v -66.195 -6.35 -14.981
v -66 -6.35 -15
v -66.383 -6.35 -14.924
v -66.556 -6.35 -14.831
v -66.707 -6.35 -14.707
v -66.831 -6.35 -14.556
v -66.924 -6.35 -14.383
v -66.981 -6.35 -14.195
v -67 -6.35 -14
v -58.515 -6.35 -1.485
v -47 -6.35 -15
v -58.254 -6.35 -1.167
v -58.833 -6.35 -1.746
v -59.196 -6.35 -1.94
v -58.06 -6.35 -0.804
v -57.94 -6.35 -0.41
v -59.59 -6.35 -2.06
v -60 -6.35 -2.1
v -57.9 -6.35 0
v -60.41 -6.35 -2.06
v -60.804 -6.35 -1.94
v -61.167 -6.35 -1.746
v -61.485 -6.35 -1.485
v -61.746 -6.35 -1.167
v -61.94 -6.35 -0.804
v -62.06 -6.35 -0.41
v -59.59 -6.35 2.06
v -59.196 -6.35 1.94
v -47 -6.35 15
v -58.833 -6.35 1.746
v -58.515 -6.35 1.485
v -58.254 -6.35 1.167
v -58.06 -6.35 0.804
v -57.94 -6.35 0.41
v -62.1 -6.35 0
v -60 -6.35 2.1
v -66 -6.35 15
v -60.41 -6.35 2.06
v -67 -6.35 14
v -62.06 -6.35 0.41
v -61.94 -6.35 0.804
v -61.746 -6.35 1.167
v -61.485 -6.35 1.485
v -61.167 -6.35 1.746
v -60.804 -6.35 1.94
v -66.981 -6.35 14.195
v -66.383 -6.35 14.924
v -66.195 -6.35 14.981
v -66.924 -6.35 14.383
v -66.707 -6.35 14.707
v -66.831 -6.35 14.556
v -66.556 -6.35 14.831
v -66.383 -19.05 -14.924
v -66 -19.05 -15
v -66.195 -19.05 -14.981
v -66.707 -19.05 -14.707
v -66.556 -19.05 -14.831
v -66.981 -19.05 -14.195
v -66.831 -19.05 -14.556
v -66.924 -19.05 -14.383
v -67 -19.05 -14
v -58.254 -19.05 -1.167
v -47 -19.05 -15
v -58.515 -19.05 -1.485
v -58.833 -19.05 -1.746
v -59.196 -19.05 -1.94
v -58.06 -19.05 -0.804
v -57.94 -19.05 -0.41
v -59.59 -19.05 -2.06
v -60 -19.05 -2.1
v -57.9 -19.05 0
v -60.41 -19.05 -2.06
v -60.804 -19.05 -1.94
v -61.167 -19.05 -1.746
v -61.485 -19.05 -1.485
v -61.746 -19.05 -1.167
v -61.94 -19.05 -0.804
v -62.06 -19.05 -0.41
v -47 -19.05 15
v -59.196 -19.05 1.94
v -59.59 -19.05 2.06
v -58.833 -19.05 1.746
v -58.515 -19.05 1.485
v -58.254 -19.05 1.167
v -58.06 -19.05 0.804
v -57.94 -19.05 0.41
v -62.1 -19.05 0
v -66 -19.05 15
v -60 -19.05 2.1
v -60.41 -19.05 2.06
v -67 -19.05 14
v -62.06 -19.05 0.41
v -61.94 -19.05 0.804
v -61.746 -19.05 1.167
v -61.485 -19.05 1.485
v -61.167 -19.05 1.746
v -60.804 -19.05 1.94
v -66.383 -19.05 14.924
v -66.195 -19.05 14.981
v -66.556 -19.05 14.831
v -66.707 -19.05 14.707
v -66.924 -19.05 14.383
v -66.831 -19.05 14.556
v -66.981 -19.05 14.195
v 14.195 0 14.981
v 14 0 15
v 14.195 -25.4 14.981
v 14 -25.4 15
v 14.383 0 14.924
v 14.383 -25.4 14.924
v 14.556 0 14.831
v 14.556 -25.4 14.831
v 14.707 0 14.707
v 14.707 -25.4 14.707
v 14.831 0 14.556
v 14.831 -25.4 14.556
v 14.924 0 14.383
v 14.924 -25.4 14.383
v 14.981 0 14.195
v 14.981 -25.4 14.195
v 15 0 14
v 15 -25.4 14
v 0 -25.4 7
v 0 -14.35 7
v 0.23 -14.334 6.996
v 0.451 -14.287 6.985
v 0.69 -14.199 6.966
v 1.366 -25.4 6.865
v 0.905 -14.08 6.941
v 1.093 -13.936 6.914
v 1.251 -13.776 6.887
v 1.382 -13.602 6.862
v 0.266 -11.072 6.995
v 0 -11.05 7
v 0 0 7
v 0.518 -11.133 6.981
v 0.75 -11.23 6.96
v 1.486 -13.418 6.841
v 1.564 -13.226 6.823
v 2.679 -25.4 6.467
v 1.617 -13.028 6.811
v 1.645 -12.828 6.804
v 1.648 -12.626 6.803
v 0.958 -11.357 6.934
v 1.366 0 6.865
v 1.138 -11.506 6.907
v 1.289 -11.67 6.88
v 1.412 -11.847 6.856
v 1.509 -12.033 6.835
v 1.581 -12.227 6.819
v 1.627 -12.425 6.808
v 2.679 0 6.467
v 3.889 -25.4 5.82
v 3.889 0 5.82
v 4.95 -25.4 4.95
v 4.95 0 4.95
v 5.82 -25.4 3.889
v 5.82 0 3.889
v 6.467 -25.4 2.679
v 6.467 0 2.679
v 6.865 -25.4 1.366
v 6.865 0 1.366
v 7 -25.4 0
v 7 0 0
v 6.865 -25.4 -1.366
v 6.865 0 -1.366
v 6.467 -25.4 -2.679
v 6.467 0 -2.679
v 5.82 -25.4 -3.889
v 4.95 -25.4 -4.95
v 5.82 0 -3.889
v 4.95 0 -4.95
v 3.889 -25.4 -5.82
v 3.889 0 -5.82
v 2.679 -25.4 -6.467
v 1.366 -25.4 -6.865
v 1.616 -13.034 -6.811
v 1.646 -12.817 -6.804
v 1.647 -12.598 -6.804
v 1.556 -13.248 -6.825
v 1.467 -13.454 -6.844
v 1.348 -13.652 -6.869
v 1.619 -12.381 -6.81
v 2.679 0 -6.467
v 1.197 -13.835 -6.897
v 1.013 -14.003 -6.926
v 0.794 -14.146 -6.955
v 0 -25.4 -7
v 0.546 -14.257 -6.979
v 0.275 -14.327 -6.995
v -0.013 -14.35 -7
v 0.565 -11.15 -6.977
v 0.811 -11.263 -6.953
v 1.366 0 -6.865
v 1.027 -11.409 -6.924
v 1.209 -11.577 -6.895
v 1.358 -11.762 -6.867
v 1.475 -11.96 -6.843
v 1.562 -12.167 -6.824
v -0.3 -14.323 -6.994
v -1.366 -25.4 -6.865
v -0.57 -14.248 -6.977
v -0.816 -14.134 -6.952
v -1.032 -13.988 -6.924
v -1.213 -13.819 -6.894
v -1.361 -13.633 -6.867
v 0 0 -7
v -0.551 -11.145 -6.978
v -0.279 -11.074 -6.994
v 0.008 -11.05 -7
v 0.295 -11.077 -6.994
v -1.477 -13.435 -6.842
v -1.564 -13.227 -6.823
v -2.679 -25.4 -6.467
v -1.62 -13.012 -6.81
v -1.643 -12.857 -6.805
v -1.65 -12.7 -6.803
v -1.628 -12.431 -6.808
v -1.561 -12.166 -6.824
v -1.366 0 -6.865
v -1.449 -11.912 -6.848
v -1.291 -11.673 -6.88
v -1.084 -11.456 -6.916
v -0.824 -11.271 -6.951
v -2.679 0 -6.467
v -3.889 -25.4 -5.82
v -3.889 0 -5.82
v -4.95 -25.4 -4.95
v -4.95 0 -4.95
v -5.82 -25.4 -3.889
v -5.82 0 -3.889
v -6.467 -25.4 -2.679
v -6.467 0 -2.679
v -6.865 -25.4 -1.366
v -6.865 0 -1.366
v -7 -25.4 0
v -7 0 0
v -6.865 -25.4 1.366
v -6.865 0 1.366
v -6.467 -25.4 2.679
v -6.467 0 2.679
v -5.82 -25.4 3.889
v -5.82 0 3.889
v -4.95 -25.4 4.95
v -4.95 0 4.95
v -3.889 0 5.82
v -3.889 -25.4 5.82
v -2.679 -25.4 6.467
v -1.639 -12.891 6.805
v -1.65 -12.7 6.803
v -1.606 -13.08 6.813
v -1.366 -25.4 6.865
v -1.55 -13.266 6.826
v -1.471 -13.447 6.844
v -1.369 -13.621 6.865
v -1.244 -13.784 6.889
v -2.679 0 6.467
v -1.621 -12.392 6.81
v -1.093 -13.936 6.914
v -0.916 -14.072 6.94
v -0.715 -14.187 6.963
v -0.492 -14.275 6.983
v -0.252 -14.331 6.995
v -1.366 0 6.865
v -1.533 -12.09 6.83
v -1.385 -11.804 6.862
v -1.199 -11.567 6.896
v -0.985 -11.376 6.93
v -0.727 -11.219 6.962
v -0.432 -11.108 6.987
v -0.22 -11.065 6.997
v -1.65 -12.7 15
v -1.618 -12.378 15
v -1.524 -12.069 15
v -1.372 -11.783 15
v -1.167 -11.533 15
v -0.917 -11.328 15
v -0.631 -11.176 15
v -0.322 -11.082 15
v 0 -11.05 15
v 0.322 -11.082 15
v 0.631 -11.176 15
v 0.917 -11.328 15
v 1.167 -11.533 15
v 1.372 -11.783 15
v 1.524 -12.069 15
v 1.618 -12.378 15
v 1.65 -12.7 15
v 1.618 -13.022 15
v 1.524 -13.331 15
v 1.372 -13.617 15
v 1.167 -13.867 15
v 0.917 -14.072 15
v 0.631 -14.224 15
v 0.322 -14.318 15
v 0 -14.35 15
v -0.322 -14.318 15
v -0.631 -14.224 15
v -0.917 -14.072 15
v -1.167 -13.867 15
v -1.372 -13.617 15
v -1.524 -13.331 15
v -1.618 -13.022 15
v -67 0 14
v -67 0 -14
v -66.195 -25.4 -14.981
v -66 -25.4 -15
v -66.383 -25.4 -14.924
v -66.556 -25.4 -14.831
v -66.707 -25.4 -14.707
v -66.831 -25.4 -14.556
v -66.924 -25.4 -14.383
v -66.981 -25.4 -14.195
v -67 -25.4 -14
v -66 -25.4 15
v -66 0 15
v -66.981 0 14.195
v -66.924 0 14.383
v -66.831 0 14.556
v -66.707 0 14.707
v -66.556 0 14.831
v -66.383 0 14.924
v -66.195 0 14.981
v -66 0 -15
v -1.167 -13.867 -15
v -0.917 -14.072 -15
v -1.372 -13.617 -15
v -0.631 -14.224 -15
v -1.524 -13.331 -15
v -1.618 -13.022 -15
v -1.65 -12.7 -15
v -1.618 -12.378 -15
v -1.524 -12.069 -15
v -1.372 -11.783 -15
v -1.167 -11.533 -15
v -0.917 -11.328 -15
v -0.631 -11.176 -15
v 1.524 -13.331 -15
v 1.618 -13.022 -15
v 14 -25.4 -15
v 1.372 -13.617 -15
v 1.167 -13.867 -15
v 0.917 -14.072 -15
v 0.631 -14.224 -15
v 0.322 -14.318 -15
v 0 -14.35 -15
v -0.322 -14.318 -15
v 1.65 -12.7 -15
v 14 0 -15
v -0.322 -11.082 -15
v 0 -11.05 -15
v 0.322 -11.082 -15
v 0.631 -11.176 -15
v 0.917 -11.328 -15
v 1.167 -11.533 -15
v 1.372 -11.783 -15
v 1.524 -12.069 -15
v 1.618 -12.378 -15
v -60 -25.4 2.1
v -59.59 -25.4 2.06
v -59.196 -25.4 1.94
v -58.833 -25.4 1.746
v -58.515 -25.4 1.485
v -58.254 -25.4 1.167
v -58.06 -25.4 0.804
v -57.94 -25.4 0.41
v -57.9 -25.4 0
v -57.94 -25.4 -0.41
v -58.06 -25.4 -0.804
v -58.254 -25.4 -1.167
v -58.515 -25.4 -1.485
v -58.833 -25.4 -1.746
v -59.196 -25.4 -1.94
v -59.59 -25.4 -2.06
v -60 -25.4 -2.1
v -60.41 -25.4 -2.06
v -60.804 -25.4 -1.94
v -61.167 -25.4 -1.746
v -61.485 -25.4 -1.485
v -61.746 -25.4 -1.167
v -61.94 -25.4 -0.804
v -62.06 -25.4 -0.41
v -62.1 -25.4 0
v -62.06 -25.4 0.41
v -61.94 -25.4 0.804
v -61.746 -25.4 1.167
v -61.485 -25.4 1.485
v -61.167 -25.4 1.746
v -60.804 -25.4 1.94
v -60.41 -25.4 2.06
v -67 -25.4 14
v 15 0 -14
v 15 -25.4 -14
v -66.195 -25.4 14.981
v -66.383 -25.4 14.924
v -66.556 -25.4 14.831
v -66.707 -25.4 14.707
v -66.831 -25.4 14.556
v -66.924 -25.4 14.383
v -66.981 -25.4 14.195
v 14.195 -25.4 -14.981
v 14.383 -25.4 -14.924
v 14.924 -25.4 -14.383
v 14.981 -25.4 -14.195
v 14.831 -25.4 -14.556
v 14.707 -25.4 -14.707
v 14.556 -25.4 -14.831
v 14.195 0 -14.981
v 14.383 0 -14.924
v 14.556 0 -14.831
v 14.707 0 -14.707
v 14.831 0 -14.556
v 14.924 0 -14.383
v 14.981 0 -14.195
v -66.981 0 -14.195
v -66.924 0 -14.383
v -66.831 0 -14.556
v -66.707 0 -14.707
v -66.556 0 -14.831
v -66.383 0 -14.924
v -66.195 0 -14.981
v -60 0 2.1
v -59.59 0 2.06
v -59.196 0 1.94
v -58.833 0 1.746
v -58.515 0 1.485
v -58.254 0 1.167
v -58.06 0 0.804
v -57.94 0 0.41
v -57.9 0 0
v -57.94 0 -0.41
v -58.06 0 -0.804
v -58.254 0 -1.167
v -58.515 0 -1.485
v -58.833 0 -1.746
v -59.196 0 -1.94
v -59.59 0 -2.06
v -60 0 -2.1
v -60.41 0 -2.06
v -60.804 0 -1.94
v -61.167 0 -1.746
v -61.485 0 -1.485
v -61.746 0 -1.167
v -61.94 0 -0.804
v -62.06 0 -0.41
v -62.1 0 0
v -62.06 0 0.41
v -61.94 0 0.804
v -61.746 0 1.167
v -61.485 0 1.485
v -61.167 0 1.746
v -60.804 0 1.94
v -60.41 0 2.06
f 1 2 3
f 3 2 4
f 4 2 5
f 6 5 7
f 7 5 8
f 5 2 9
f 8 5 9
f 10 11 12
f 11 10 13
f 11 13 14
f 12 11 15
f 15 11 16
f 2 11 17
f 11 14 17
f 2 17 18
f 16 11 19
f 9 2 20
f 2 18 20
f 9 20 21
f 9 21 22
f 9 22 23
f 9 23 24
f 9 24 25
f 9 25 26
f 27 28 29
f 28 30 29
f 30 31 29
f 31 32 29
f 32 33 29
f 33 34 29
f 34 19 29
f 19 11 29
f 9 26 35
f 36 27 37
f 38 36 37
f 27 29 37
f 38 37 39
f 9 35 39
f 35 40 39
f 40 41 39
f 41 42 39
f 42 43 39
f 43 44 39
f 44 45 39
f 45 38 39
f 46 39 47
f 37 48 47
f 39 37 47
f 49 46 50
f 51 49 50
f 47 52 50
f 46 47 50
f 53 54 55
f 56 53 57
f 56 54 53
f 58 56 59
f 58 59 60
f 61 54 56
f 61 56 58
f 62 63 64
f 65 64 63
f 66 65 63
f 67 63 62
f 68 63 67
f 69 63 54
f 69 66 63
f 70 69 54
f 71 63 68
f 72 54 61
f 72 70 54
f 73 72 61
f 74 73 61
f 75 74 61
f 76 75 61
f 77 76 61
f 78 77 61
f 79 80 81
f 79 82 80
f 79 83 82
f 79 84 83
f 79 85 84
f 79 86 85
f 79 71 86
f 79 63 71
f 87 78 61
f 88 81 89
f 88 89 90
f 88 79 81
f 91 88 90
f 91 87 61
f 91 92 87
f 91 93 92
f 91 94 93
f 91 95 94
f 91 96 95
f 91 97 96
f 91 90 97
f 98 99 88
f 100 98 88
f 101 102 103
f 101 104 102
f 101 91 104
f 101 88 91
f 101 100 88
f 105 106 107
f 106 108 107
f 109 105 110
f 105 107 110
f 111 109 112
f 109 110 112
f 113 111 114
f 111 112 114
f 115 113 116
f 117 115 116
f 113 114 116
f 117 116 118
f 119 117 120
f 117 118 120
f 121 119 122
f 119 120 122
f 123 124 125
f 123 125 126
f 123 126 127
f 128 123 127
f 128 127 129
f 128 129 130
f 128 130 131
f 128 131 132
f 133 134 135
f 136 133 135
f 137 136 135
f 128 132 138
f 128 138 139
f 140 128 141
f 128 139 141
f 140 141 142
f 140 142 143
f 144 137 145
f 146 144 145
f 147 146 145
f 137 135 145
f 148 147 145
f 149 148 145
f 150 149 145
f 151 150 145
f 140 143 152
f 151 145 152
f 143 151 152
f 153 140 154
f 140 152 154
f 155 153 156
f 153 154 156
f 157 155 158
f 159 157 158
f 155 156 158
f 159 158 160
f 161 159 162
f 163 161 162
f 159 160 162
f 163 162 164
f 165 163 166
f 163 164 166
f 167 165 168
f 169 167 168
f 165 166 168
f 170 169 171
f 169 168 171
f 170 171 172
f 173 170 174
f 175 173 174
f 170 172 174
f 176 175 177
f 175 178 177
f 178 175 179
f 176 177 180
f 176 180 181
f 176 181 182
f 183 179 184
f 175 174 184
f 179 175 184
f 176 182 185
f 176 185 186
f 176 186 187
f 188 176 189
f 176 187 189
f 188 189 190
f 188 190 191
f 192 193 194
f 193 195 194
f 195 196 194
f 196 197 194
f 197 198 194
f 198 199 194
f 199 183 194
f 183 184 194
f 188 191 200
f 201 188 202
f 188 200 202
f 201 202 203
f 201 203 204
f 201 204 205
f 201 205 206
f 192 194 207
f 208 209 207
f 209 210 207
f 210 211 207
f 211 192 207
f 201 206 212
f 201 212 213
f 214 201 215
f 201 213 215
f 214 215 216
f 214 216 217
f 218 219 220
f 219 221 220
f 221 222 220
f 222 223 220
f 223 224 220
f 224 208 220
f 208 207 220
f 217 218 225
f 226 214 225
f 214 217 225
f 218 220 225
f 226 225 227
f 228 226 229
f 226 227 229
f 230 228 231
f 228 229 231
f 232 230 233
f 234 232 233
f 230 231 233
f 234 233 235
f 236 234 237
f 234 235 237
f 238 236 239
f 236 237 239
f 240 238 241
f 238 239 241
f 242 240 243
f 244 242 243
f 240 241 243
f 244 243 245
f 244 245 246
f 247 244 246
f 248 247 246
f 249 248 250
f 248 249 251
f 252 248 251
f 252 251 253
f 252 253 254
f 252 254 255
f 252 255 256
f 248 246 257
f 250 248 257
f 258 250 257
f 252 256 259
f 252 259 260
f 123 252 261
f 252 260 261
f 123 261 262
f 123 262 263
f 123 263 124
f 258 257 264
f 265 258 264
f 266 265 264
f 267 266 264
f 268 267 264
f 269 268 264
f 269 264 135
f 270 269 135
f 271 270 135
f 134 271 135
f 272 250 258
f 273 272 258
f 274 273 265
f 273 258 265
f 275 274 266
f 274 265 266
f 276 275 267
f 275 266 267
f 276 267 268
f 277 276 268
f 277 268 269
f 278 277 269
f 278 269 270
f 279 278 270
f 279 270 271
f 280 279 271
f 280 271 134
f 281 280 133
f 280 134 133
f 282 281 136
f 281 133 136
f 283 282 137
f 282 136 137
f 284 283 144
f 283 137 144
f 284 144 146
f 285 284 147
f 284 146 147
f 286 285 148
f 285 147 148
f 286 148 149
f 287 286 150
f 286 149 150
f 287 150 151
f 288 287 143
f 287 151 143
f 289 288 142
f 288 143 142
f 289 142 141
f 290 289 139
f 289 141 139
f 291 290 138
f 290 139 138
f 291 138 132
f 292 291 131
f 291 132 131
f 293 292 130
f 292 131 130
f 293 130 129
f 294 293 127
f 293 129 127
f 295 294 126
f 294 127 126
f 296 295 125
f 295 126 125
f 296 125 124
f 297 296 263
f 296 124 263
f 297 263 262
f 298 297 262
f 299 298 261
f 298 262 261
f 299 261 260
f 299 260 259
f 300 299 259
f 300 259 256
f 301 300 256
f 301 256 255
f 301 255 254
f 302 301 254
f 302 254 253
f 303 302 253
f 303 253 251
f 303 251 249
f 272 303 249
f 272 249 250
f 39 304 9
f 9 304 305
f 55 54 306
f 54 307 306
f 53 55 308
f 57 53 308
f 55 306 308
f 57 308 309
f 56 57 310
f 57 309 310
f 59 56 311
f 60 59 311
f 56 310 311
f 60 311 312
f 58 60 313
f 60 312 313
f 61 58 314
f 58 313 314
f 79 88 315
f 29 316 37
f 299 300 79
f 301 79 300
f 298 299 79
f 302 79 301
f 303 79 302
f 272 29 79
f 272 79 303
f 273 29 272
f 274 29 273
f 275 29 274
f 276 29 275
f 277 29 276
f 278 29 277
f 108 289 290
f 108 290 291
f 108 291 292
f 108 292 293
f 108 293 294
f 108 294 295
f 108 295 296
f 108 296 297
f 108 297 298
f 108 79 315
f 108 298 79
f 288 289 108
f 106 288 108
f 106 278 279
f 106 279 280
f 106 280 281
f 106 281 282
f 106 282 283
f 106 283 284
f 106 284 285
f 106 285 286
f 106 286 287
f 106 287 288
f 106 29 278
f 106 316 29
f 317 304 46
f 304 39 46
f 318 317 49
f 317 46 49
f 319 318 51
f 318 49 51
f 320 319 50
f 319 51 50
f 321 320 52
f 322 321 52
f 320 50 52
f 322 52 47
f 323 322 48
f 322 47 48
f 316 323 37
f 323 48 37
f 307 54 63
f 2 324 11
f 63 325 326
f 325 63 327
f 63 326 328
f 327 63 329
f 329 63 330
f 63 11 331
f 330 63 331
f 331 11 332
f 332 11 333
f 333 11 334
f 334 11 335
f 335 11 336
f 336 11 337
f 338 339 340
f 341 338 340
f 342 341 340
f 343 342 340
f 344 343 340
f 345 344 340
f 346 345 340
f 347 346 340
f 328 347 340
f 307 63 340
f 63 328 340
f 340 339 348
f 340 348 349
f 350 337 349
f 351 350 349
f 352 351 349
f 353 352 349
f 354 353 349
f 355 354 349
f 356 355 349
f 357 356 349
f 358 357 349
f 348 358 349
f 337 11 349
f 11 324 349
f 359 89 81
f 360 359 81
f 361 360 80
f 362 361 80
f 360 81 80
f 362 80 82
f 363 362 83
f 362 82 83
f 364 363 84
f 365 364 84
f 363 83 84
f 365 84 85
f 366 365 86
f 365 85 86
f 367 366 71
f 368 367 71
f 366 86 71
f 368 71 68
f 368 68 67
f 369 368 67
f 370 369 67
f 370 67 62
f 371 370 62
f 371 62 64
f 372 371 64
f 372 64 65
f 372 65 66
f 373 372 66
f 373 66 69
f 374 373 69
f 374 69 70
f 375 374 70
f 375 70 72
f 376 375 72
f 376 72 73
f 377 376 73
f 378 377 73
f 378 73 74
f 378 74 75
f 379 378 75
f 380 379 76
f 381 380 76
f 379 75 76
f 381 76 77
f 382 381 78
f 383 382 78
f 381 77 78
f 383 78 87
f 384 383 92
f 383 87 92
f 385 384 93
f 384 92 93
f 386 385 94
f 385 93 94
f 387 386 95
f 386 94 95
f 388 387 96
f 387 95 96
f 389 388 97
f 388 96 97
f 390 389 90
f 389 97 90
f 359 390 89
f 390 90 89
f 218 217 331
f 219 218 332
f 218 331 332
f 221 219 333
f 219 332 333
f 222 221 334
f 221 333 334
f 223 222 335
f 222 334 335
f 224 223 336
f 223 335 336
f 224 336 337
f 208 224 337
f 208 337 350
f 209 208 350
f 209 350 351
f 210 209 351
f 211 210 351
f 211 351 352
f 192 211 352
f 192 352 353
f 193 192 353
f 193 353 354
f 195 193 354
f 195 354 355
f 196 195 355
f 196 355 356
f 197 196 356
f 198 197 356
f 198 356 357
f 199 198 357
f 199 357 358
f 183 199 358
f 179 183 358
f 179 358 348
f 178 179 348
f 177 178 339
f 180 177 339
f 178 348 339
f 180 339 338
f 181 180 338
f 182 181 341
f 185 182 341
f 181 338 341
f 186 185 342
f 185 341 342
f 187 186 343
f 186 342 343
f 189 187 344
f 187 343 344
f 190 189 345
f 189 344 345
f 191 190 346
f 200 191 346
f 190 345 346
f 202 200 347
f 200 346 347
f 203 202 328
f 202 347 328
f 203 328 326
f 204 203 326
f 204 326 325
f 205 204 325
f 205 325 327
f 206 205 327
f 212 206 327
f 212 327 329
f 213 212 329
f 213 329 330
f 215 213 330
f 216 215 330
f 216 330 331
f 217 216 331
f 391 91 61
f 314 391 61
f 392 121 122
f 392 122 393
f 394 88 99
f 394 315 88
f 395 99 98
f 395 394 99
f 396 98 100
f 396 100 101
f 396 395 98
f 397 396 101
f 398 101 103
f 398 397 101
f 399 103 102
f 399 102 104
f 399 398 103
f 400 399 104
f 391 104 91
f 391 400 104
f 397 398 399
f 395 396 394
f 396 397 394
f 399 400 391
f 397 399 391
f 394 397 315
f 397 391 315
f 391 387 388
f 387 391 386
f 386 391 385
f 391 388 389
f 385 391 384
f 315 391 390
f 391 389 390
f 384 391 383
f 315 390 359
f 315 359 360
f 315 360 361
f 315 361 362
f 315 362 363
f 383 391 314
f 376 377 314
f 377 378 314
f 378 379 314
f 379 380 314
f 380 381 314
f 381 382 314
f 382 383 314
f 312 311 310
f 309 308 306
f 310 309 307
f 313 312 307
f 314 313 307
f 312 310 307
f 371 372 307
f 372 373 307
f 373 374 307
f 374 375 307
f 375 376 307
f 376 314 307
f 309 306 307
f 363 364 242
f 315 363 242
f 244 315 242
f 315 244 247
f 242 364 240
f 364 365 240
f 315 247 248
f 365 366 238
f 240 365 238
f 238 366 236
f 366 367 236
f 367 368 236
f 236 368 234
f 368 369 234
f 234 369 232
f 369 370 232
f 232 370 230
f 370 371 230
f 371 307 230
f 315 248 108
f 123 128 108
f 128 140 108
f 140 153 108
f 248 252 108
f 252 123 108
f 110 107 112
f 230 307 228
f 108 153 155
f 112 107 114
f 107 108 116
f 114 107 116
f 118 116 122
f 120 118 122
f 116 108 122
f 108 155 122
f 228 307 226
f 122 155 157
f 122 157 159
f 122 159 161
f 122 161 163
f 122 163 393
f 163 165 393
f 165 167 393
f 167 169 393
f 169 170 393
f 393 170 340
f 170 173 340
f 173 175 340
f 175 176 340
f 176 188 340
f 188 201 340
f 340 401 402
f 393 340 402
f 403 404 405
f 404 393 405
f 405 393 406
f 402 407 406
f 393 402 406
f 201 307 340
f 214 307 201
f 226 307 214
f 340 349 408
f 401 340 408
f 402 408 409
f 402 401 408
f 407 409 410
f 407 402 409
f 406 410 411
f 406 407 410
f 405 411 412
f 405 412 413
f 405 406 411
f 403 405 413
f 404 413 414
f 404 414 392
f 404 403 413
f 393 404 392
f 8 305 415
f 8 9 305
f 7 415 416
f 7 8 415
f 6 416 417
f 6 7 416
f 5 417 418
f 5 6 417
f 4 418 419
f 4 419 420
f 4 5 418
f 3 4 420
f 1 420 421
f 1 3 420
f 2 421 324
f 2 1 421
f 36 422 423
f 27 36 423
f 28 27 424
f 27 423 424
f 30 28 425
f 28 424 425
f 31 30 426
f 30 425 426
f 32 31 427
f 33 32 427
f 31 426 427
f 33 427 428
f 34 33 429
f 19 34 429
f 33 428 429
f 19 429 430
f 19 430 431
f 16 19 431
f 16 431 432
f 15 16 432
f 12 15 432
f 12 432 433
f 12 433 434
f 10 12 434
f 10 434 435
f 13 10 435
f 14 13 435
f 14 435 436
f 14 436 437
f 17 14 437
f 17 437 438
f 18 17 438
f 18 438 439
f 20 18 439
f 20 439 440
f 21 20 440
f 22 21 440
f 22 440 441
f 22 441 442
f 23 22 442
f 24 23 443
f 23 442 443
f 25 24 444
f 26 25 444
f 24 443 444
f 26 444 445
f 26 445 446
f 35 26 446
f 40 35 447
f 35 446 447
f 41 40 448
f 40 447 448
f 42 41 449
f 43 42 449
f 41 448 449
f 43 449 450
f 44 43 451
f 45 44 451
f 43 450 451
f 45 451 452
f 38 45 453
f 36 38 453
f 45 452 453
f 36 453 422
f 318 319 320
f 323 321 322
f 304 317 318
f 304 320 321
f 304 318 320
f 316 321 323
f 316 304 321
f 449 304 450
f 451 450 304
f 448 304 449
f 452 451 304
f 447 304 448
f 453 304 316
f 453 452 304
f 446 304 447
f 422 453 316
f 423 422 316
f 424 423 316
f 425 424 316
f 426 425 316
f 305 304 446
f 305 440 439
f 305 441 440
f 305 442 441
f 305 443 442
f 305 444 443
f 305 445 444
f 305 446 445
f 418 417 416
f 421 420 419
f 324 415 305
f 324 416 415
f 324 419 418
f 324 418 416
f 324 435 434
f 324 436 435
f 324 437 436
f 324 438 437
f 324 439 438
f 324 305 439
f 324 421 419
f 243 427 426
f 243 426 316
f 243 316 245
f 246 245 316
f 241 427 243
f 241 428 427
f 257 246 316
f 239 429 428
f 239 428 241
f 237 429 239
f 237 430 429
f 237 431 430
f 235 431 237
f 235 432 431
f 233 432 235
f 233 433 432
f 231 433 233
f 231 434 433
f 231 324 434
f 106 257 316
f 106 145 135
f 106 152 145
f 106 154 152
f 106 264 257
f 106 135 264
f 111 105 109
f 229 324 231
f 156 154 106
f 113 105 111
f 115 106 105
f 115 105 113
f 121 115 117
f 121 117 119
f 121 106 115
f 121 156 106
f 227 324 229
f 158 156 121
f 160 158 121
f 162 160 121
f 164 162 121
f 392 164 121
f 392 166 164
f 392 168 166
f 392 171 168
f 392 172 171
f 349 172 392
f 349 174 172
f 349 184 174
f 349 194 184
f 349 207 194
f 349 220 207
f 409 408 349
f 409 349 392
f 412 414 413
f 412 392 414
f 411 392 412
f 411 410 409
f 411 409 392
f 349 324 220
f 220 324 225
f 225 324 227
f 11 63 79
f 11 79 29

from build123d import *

# Parameters (mm, degrees)
SKETCH1_W                   = 82
SKETCH1_H                   = 30
SKETCH1_R                   = 7
SKETCH1_R_2                 = 2.1
BOSS_EXTRUDE1_DEPTH         = 25.4
SKETCH2_W                   = 20
SKETCH2_H                   = 12.7
CUT_EXTRUDE1_DEPTH          = 32
FILLET1_R                   = 1
TAP_DRILL_FOR_M4X0_7_TAP1_D = 3.3


with BuildPart() as part:
    # Sketch1 → Boss-Extrude1 (new body)
    with BuildSketch(Plane(origin=(0, 0, 0), x_dir=(1, 0, 0), z_dir=(0, 1, 0))):
        with Locations((-26, 0)):
            Rectangle(SKETCH1_W, SKETCH1_H)
        with Locations(Location((0, 0, 0), (0, 0, 270))):
            Circle(SKETCH1_R, mode=Mode.SUBTRACT)
        with Locations(Location((-60, 0, 0), (0, 0, 270))):
            Circle(SKETCH1_R_2, mode=Mode.SUBTRACT)
    extrude(amount=-BOSS_EXTRUDE1_DEPTH)

    # Sketch2 → Cut-Extrude1 (cut)
    with BuildSketch(Plane(origin=(0, 0, 15), x_dir=(-1, 0, 0), z_dir=(0, 0, -1))):
        with Locations((57, -12.7)):
            Rectangle(SKETCH2_W, SKETCH2_H)
    extrude(amount=CUT_EXTRUDE1_DEPTH, mode=Mode.SUBTRACT)

    # Fillet1
    fillet1_edges = [part.edges().sort_by_distance(p)[0] for p in [
        (-67, -3.175, -15),
        (-67, -3.175, 15),
        (15, -12.7, 15),
        (-67, -22.225, 15),
        (-67, -22.225, -15),
        (15, -12.7, -15),
    ]]
    fillet(fillet1_edges, radius=FILLET1_R)

    # Tap Drill for M4x0.7 Tap1 (through all)
    with Locations(Plane(origin=(0, -12.7, 15), x_dir=(1, 0, 0), z_dir=(0, 0, 1))):
        with Locations((0, 0)):
            Hole(TAP_DRILL_FOR_M4X0_7_TAP1_D / 2)


solid = part.part
